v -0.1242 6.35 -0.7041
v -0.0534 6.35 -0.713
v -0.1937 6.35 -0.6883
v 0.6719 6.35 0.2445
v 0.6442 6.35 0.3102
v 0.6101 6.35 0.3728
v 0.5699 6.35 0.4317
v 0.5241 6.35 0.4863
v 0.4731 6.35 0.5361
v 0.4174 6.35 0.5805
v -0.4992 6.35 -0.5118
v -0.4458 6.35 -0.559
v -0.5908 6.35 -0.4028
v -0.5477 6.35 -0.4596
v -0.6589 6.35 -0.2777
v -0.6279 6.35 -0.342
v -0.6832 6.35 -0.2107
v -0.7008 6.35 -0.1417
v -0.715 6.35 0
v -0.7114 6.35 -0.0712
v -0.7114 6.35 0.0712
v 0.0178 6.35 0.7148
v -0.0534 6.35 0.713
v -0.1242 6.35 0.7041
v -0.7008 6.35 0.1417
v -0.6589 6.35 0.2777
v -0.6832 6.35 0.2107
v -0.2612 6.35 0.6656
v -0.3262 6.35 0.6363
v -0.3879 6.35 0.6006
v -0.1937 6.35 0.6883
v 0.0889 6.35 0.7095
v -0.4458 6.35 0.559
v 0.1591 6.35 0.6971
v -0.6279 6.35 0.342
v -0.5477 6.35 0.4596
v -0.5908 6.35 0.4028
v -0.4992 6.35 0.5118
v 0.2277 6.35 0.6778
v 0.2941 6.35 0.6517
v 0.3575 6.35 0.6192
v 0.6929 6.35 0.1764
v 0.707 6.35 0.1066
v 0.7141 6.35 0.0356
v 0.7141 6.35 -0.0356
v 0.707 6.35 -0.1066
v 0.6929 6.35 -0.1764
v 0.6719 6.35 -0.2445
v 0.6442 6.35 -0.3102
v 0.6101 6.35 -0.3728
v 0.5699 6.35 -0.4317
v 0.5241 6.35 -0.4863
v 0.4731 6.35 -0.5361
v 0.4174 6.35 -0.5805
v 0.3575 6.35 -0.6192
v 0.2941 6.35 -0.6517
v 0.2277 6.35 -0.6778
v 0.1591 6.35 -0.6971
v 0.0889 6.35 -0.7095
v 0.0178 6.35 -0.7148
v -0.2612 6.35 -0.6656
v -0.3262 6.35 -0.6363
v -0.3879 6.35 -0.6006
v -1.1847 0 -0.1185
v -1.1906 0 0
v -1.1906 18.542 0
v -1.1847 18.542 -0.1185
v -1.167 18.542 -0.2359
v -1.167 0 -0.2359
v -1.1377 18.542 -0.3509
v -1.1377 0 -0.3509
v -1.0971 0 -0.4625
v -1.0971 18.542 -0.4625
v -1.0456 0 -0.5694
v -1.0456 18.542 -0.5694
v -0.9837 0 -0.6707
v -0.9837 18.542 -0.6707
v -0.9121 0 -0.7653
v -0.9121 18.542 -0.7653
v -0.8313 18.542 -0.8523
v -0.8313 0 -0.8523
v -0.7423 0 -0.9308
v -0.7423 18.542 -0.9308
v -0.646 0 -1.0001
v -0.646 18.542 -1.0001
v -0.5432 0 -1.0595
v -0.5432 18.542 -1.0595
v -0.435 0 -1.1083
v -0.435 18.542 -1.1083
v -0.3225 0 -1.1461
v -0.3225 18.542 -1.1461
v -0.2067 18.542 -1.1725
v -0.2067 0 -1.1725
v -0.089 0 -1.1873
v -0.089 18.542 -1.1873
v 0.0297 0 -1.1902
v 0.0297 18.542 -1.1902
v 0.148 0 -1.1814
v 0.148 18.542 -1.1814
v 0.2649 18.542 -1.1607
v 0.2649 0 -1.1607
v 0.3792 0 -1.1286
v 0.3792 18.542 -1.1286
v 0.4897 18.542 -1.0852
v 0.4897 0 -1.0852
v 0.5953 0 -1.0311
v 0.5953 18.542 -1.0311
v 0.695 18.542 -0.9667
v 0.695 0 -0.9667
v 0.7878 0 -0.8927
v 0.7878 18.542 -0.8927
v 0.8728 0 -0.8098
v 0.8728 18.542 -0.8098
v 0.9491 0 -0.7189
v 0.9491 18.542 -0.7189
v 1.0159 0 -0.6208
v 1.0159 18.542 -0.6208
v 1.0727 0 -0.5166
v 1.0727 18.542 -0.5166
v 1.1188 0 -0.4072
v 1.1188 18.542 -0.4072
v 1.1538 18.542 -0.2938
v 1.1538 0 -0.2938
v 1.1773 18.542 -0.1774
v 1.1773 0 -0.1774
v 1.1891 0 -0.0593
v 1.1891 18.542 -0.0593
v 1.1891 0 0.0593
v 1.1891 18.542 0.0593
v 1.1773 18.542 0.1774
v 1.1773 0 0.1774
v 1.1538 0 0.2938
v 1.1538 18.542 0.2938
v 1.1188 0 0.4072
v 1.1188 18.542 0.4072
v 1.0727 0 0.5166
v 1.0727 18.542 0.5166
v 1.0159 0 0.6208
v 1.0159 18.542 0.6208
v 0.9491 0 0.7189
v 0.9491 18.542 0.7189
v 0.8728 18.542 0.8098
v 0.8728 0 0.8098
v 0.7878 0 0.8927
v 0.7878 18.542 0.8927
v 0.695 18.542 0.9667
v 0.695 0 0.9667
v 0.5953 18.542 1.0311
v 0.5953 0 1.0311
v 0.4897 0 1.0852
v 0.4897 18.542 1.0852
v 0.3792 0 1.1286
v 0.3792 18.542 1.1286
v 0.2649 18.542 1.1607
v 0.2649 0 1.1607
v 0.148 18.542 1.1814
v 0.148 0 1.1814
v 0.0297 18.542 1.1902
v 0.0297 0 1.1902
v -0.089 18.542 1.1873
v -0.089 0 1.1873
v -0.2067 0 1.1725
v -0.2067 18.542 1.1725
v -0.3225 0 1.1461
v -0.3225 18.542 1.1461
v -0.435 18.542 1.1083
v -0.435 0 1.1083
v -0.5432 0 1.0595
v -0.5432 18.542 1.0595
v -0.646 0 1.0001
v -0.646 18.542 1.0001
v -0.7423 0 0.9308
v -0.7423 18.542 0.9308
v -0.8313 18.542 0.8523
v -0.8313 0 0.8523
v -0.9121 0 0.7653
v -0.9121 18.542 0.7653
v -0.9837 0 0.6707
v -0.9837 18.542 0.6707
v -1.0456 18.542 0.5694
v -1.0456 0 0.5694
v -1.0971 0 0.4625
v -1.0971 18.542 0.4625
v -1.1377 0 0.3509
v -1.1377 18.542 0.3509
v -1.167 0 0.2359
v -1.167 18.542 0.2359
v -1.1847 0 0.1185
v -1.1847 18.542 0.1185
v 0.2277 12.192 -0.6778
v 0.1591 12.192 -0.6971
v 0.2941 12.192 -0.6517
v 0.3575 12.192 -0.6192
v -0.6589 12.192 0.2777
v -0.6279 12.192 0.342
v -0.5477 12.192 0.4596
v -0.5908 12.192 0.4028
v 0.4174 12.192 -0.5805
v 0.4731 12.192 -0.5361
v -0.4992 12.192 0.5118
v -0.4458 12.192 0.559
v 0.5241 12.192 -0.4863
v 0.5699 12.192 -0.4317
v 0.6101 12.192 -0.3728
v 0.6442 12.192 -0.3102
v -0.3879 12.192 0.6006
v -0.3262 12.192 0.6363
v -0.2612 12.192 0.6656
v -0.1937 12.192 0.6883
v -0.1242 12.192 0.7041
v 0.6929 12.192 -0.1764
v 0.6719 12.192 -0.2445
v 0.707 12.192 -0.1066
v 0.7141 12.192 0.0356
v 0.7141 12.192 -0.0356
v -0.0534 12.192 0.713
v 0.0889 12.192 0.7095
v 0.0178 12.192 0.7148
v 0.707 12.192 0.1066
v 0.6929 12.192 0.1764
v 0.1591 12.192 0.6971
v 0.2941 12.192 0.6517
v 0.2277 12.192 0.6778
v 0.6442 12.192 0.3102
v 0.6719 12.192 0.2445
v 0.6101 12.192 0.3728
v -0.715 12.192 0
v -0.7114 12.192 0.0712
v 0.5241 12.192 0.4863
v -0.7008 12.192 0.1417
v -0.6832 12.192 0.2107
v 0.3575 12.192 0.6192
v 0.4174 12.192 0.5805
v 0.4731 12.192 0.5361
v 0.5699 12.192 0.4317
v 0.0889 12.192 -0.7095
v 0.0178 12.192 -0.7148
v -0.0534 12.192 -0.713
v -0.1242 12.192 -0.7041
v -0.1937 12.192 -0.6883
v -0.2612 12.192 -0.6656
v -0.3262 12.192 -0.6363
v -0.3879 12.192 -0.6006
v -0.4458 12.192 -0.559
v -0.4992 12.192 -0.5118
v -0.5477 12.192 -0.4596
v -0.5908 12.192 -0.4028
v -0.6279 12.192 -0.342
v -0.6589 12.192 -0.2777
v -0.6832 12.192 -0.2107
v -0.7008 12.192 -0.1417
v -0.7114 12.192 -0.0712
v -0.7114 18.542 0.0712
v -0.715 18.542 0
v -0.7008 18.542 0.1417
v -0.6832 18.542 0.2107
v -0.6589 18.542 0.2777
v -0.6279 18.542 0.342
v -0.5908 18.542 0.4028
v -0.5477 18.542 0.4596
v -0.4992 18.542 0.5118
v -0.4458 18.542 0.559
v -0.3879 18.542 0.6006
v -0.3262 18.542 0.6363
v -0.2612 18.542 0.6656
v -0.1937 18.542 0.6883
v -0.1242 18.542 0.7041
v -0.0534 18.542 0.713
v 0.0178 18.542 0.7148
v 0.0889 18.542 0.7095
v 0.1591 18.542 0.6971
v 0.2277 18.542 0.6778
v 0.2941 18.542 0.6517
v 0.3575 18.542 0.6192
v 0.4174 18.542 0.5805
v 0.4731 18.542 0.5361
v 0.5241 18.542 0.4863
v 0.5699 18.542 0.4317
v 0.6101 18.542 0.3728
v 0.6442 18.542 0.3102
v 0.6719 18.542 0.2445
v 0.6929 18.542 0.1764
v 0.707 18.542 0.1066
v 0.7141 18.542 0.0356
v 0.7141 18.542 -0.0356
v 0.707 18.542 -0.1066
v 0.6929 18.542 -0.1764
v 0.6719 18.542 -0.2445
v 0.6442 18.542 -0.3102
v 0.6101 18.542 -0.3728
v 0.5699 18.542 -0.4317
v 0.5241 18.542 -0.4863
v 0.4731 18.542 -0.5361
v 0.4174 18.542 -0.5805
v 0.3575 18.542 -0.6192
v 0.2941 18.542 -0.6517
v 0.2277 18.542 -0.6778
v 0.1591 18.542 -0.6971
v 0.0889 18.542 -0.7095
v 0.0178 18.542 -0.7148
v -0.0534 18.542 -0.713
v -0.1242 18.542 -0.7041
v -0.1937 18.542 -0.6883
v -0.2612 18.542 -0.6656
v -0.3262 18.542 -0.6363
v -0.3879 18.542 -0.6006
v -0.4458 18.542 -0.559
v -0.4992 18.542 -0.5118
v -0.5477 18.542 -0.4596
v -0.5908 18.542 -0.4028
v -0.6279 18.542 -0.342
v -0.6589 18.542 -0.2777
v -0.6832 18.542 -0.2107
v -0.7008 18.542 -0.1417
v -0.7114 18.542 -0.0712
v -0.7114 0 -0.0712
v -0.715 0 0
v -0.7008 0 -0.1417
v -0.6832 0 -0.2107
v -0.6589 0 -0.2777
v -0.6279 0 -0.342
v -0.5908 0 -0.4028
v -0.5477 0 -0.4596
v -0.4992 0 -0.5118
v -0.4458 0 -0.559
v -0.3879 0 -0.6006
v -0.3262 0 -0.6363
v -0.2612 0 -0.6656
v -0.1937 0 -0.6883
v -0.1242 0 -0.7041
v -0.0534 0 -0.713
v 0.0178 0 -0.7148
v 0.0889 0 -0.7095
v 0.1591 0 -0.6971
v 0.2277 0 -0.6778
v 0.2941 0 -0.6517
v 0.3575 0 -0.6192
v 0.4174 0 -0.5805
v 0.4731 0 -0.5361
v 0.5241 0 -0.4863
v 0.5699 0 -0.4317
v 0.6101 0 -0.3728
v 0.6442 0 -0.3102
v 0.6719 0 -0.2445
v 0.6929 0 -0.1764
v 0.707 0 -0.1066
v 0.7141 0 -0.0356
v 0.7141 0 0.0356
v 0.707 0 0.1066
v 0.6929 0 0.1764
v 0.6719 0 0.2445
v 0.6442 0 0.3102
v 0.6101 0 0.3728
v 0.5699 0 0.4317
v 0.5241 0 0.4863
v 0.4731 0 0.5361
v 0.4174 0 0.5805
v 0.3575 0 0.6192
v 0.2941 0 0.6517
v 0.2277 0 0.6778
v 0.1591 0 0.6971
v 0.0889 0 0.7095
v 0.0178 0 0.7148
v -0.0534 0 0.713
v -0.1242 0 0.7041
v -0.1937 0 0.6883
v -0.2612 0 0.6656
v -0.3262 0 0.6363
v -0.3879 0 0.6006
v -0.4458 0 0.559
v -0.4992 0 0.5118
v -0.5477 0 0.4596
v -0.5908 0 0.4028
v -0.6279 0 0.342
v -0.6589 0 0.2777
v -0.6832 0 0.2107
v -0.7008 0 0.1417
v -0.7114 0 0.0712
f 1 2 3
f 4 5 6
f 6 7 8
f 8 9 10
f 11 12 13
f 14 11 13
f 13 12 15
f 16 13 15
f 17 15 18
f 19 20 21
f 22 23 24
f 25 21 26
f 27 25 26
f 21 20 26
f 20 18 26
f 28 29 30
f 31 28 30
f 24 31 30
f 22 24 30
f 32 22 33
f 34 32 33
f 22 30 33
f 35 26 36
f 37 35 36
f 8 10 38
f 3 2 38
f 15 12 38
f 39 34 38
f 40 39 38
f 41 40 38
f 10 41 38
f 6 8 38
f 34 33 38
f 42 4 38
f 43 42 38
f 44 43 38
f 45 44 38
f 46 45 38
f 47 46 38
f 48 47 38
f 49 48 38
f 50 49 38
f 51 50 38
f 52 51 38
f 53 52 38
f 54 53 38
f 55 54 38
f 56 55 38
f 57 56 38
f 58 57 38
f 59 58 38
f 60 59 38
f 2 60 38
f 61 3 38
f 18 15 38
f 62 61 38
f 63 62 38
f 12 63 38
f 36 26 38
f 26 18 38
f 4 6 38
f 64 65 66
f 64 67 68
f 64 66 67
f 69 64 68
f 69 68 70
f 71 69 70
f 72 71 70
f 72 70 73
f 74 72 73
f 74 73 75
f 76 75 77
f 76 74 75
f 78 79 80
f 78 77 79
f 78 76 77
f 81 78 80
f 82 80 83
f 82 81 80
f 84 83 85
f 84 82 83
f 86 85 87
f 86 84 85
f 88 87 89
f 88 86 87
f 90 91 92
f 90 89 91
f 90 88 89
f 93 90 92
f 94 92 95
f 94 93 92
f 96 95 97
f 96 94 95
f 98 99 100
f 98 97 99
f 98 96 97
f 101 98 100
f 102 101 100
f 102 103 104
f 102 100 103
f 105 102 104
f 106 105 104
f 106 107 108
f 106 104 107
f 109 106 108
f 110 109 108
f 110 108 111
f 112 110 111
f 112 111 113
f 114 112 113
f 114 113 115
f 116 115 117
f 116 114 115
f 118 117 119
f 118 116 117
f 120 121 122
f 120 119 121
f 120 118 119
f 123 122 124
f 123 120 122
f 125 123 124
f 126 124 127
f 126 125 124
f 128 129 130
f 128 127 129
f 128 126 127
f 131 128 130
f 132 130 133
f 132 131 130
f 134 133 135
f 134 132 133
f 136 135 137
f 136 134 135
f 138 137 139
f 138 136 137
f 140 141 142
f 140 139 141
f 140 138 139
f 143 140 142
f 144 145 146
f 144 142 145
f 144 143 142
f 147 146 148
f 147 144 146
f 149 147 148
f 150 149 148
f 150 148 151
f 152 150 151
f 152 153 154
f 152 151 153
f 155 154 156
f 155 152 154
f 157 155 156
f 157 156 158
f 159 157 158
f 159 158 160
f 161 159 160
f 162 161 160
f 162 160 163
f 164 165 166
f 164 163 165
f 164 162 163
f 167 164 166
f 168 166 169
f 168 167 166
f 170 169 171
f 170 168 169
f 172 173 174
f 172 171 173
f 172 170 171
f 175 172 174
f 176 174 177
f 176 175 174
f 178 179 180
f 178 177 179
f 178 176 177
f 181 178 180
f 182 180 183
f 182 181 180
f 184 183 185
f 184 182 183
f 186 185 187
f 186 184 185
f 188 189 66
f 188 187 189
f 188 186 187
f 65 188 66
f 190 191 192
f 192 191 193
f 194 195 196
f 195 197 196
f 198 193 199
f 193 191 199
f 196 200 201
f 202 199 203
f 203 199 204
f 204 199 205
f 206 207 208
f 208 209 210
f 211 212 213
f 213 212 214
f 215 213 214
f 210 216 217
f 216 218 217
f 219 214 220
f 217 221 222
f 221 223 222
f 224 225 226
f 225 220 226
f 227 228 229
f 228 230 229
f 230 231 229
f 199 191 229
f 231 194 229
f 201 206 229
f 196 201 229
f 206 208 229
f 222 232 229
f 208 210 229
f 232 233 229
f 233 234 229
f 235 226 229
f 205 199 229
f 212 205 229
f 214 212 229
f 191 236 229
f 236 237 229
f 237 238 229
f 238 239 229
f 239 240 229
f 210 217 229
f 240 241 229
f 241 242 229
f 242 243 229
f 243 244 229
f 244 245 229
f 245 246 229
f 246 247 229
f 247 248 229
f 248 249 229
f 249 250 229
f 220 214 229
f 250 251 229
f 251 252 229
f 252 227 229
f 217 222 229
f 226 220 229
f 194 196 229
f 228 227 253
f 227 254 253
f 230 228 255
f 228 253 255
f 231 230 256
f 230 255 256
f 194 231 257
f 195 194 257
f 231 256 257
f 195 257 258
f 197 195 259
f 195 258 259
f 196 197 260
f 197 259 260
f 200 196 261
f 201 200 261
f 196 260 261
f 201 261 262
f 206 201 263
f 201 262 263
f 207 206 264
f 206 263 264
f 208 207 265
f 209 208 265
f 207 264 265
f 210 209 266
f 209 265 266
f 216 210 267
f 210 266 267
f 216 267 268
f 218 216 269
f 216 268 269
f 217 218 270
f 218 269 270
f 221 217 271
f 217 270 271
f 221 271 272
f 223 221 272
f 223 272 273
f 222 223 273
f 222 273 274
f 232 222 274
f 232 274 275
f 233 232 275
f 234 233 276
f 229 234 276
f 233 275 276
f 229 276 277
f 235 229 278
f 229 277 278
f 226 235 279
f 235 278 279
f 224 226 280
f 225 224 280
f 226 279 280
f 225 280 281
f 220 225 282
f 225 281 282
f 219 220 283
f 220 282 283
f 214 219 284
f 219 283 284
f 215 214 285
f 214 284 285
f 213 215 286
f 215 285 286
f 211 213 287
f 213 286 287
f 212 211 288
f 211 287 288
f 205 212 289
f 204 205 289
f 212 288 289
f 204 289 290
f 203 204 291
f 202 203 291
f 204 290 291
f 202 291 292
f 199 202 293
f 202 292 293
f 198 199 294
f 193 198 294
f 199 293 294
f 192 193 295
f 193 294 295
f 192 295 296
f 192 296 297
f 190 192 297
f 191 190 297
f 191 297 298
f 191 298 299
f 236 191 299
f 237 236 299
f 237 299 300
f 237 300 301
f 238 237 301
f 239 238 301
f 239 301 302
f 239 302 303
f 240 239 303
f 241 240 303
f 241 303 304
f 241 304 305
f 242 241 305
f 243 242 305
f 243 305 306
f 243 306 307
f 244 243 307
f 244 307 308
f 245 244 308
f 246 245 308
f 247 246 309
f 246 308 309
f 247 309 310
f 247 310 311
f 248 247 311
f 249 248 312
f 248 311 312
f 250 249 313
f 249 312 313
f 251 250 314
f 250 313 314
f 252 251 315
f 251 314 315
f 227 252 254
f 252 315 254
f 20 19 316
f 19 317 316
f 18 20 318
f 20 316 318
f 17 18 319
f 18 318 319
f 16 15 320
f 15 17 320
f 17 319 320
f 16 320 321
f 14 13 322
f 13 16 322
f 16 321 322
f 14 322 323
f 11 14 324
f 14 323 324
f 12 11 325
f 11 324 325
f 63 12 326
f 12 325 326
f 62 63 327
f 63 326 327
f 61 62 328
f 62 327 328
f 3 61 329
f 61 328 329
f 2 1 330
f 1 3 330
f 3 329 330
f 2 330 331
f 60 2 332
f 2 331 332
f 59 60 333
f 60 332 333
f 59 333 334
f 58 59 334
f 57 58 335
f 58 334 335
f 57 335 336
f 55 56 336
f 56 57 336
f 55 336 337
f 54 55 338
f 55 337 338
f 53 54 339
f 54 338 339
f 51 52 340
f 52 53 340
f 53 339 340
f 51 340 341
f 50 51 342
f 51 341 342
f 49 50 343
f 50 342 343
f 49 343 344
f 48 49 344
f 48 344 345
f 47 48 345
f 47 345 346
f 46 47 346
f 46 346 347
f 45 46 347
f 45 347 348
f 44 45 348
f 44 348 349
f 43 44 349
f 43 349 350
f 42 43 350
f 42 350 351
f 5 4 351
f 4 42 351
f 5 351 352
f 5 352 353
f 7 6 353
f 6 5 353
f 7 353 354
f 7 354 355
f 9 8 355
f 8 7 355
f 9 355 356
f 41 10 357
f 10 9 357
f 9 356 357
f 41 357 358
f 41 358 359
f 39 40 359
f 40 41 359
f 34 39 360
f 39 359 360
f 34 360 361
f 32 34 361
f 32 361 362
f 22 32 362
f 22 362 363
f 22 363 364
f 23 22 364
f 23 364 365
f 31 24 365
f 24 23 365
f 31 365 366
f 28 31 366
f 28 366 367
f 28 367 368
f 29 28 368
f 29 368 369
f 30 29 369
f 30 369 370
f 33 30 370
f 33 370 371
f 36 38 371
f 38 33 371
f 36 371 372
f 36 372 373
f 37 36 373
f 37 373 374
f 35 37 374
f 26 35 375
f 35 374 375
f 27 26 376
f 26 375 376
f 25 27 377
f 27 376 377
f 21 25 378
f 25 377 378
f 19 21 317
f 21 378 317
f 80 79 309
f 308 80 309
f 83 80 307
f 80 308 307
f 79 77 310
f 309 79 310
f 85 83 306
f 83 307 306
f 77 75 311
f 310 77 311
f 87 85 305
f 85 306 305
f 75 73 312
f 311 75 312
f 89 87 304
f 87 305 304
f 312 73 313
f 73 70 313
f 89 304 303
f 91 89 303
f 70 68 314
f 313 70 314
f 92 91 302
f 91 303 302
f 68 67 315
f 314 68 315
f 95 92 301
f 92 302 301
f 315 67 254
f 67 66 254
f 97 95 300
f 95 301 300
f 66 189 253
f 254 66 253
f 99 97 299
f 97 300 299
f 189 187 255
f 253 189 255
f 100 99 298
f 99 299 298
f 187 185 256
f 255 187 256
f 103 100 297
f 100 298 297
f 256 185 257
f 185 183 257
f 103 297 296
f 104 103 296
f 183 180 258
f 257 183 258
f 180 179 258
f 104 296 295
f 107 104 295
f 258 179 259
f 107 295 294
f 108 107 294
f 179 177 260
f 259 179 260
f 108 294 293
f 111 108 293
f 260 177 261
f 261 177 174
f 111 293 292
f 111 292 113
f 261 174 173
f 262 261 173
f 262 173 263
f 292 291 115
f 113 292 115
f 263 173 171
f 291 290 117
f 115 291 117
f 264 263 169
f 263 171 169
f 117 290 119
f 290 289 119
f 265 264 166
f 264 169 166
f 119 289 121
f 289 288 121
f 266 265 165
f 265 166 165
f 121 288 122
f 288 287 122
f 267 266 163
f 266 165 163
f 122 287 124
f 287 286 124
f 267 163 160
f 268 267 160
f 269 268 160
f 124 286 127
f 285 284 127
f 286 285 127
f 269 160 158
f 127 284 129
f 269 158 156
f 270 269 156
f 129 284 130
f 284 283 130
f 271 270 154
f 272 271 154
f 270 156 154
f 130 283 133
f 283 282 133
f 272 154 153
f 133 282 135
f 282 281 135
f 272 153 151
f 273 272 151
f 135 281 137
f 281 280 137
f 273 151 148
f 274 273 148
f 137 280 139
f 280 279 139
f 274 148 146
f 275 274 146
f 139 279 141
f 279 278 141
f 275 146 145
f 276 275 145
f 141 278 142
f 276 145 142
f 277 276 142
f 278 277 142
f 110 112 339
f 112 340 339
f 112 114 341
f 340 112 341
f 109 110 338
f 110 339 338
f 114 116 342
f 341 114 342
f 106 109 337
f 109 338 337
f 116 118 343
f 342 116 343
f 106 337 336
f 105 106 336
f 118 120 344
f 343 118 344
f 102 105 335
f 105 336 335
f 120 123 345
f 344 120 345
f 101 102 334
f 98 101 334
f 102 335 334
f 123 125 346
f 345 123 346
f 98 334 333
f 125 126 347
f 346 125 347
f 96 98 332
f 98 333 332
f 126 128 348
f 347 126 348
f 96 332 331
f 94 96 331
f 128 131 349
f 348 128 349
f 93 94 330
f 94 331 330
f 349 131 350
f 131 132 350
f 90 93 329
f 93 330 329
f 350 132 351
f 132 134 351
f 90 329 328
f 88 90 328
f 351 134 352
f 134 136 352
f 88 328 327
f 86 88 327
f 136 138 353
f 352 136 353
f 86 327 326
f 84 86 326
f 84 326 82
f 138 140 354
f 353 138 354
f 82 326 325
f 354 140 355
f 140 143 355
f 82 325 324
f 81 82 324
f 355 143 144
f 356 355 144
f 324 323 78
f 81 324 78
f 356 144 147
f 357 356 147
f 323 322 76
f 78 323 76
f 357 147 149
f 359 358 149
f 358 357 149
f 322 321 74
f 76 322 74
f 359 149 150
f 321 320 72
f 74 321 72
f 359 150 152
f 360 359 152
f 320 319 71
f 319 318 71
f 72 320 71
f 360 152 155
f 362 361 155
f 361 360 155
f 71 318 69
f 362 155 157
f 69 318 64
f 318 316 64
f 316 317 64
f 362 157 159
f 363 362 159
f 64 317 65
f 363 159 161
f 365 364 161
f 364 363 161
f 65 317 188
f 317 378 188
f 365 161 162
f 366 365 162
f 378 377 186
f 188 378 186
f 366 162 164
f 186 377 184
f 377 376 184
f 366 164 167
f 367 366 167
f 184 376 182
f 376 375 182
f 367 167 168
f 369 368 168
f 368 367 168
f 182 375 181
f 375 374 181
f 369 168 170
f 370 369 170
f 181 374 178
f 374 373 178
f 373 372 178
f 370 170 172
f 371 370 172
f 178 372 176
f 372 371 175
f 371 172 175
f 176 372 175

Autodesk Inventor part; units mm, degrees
ref_plane "YZ Plane" through (0, 0, 0) normal (1, 0, 0) x (0, 1, 0)
ref_plane "XZ Plane" through (0, 0, 0) normal (0, 1, 0) x (-1, 0, 0)
ref_plane "XY Plane" through (0, 0, 0) normal (0, 0, 1) x (1, 0, 0)
sketch "Sketch1" plane through (0, 0, 0) normal (0, 1, 0) x (-1, 0, 0)
  circle A0 centre (0, 0) radius 1.1906
  circle A1 centre (0, 0) radius 0.715
  dimension "d0" = 2.3813
  dimension "d1" = 1.43
extrude "Extrusion1" add sketch "Sketch1" along normal blind 9.271 contours A0 | A1
extrude "Extrusion2" cut sketch "Sketch1" along normal blind 6.35 contours A1
mirror "Mirror1" about plane through (0, 9.271, 0) normal (0, 1, 0)
properties part number "Frame Post"
